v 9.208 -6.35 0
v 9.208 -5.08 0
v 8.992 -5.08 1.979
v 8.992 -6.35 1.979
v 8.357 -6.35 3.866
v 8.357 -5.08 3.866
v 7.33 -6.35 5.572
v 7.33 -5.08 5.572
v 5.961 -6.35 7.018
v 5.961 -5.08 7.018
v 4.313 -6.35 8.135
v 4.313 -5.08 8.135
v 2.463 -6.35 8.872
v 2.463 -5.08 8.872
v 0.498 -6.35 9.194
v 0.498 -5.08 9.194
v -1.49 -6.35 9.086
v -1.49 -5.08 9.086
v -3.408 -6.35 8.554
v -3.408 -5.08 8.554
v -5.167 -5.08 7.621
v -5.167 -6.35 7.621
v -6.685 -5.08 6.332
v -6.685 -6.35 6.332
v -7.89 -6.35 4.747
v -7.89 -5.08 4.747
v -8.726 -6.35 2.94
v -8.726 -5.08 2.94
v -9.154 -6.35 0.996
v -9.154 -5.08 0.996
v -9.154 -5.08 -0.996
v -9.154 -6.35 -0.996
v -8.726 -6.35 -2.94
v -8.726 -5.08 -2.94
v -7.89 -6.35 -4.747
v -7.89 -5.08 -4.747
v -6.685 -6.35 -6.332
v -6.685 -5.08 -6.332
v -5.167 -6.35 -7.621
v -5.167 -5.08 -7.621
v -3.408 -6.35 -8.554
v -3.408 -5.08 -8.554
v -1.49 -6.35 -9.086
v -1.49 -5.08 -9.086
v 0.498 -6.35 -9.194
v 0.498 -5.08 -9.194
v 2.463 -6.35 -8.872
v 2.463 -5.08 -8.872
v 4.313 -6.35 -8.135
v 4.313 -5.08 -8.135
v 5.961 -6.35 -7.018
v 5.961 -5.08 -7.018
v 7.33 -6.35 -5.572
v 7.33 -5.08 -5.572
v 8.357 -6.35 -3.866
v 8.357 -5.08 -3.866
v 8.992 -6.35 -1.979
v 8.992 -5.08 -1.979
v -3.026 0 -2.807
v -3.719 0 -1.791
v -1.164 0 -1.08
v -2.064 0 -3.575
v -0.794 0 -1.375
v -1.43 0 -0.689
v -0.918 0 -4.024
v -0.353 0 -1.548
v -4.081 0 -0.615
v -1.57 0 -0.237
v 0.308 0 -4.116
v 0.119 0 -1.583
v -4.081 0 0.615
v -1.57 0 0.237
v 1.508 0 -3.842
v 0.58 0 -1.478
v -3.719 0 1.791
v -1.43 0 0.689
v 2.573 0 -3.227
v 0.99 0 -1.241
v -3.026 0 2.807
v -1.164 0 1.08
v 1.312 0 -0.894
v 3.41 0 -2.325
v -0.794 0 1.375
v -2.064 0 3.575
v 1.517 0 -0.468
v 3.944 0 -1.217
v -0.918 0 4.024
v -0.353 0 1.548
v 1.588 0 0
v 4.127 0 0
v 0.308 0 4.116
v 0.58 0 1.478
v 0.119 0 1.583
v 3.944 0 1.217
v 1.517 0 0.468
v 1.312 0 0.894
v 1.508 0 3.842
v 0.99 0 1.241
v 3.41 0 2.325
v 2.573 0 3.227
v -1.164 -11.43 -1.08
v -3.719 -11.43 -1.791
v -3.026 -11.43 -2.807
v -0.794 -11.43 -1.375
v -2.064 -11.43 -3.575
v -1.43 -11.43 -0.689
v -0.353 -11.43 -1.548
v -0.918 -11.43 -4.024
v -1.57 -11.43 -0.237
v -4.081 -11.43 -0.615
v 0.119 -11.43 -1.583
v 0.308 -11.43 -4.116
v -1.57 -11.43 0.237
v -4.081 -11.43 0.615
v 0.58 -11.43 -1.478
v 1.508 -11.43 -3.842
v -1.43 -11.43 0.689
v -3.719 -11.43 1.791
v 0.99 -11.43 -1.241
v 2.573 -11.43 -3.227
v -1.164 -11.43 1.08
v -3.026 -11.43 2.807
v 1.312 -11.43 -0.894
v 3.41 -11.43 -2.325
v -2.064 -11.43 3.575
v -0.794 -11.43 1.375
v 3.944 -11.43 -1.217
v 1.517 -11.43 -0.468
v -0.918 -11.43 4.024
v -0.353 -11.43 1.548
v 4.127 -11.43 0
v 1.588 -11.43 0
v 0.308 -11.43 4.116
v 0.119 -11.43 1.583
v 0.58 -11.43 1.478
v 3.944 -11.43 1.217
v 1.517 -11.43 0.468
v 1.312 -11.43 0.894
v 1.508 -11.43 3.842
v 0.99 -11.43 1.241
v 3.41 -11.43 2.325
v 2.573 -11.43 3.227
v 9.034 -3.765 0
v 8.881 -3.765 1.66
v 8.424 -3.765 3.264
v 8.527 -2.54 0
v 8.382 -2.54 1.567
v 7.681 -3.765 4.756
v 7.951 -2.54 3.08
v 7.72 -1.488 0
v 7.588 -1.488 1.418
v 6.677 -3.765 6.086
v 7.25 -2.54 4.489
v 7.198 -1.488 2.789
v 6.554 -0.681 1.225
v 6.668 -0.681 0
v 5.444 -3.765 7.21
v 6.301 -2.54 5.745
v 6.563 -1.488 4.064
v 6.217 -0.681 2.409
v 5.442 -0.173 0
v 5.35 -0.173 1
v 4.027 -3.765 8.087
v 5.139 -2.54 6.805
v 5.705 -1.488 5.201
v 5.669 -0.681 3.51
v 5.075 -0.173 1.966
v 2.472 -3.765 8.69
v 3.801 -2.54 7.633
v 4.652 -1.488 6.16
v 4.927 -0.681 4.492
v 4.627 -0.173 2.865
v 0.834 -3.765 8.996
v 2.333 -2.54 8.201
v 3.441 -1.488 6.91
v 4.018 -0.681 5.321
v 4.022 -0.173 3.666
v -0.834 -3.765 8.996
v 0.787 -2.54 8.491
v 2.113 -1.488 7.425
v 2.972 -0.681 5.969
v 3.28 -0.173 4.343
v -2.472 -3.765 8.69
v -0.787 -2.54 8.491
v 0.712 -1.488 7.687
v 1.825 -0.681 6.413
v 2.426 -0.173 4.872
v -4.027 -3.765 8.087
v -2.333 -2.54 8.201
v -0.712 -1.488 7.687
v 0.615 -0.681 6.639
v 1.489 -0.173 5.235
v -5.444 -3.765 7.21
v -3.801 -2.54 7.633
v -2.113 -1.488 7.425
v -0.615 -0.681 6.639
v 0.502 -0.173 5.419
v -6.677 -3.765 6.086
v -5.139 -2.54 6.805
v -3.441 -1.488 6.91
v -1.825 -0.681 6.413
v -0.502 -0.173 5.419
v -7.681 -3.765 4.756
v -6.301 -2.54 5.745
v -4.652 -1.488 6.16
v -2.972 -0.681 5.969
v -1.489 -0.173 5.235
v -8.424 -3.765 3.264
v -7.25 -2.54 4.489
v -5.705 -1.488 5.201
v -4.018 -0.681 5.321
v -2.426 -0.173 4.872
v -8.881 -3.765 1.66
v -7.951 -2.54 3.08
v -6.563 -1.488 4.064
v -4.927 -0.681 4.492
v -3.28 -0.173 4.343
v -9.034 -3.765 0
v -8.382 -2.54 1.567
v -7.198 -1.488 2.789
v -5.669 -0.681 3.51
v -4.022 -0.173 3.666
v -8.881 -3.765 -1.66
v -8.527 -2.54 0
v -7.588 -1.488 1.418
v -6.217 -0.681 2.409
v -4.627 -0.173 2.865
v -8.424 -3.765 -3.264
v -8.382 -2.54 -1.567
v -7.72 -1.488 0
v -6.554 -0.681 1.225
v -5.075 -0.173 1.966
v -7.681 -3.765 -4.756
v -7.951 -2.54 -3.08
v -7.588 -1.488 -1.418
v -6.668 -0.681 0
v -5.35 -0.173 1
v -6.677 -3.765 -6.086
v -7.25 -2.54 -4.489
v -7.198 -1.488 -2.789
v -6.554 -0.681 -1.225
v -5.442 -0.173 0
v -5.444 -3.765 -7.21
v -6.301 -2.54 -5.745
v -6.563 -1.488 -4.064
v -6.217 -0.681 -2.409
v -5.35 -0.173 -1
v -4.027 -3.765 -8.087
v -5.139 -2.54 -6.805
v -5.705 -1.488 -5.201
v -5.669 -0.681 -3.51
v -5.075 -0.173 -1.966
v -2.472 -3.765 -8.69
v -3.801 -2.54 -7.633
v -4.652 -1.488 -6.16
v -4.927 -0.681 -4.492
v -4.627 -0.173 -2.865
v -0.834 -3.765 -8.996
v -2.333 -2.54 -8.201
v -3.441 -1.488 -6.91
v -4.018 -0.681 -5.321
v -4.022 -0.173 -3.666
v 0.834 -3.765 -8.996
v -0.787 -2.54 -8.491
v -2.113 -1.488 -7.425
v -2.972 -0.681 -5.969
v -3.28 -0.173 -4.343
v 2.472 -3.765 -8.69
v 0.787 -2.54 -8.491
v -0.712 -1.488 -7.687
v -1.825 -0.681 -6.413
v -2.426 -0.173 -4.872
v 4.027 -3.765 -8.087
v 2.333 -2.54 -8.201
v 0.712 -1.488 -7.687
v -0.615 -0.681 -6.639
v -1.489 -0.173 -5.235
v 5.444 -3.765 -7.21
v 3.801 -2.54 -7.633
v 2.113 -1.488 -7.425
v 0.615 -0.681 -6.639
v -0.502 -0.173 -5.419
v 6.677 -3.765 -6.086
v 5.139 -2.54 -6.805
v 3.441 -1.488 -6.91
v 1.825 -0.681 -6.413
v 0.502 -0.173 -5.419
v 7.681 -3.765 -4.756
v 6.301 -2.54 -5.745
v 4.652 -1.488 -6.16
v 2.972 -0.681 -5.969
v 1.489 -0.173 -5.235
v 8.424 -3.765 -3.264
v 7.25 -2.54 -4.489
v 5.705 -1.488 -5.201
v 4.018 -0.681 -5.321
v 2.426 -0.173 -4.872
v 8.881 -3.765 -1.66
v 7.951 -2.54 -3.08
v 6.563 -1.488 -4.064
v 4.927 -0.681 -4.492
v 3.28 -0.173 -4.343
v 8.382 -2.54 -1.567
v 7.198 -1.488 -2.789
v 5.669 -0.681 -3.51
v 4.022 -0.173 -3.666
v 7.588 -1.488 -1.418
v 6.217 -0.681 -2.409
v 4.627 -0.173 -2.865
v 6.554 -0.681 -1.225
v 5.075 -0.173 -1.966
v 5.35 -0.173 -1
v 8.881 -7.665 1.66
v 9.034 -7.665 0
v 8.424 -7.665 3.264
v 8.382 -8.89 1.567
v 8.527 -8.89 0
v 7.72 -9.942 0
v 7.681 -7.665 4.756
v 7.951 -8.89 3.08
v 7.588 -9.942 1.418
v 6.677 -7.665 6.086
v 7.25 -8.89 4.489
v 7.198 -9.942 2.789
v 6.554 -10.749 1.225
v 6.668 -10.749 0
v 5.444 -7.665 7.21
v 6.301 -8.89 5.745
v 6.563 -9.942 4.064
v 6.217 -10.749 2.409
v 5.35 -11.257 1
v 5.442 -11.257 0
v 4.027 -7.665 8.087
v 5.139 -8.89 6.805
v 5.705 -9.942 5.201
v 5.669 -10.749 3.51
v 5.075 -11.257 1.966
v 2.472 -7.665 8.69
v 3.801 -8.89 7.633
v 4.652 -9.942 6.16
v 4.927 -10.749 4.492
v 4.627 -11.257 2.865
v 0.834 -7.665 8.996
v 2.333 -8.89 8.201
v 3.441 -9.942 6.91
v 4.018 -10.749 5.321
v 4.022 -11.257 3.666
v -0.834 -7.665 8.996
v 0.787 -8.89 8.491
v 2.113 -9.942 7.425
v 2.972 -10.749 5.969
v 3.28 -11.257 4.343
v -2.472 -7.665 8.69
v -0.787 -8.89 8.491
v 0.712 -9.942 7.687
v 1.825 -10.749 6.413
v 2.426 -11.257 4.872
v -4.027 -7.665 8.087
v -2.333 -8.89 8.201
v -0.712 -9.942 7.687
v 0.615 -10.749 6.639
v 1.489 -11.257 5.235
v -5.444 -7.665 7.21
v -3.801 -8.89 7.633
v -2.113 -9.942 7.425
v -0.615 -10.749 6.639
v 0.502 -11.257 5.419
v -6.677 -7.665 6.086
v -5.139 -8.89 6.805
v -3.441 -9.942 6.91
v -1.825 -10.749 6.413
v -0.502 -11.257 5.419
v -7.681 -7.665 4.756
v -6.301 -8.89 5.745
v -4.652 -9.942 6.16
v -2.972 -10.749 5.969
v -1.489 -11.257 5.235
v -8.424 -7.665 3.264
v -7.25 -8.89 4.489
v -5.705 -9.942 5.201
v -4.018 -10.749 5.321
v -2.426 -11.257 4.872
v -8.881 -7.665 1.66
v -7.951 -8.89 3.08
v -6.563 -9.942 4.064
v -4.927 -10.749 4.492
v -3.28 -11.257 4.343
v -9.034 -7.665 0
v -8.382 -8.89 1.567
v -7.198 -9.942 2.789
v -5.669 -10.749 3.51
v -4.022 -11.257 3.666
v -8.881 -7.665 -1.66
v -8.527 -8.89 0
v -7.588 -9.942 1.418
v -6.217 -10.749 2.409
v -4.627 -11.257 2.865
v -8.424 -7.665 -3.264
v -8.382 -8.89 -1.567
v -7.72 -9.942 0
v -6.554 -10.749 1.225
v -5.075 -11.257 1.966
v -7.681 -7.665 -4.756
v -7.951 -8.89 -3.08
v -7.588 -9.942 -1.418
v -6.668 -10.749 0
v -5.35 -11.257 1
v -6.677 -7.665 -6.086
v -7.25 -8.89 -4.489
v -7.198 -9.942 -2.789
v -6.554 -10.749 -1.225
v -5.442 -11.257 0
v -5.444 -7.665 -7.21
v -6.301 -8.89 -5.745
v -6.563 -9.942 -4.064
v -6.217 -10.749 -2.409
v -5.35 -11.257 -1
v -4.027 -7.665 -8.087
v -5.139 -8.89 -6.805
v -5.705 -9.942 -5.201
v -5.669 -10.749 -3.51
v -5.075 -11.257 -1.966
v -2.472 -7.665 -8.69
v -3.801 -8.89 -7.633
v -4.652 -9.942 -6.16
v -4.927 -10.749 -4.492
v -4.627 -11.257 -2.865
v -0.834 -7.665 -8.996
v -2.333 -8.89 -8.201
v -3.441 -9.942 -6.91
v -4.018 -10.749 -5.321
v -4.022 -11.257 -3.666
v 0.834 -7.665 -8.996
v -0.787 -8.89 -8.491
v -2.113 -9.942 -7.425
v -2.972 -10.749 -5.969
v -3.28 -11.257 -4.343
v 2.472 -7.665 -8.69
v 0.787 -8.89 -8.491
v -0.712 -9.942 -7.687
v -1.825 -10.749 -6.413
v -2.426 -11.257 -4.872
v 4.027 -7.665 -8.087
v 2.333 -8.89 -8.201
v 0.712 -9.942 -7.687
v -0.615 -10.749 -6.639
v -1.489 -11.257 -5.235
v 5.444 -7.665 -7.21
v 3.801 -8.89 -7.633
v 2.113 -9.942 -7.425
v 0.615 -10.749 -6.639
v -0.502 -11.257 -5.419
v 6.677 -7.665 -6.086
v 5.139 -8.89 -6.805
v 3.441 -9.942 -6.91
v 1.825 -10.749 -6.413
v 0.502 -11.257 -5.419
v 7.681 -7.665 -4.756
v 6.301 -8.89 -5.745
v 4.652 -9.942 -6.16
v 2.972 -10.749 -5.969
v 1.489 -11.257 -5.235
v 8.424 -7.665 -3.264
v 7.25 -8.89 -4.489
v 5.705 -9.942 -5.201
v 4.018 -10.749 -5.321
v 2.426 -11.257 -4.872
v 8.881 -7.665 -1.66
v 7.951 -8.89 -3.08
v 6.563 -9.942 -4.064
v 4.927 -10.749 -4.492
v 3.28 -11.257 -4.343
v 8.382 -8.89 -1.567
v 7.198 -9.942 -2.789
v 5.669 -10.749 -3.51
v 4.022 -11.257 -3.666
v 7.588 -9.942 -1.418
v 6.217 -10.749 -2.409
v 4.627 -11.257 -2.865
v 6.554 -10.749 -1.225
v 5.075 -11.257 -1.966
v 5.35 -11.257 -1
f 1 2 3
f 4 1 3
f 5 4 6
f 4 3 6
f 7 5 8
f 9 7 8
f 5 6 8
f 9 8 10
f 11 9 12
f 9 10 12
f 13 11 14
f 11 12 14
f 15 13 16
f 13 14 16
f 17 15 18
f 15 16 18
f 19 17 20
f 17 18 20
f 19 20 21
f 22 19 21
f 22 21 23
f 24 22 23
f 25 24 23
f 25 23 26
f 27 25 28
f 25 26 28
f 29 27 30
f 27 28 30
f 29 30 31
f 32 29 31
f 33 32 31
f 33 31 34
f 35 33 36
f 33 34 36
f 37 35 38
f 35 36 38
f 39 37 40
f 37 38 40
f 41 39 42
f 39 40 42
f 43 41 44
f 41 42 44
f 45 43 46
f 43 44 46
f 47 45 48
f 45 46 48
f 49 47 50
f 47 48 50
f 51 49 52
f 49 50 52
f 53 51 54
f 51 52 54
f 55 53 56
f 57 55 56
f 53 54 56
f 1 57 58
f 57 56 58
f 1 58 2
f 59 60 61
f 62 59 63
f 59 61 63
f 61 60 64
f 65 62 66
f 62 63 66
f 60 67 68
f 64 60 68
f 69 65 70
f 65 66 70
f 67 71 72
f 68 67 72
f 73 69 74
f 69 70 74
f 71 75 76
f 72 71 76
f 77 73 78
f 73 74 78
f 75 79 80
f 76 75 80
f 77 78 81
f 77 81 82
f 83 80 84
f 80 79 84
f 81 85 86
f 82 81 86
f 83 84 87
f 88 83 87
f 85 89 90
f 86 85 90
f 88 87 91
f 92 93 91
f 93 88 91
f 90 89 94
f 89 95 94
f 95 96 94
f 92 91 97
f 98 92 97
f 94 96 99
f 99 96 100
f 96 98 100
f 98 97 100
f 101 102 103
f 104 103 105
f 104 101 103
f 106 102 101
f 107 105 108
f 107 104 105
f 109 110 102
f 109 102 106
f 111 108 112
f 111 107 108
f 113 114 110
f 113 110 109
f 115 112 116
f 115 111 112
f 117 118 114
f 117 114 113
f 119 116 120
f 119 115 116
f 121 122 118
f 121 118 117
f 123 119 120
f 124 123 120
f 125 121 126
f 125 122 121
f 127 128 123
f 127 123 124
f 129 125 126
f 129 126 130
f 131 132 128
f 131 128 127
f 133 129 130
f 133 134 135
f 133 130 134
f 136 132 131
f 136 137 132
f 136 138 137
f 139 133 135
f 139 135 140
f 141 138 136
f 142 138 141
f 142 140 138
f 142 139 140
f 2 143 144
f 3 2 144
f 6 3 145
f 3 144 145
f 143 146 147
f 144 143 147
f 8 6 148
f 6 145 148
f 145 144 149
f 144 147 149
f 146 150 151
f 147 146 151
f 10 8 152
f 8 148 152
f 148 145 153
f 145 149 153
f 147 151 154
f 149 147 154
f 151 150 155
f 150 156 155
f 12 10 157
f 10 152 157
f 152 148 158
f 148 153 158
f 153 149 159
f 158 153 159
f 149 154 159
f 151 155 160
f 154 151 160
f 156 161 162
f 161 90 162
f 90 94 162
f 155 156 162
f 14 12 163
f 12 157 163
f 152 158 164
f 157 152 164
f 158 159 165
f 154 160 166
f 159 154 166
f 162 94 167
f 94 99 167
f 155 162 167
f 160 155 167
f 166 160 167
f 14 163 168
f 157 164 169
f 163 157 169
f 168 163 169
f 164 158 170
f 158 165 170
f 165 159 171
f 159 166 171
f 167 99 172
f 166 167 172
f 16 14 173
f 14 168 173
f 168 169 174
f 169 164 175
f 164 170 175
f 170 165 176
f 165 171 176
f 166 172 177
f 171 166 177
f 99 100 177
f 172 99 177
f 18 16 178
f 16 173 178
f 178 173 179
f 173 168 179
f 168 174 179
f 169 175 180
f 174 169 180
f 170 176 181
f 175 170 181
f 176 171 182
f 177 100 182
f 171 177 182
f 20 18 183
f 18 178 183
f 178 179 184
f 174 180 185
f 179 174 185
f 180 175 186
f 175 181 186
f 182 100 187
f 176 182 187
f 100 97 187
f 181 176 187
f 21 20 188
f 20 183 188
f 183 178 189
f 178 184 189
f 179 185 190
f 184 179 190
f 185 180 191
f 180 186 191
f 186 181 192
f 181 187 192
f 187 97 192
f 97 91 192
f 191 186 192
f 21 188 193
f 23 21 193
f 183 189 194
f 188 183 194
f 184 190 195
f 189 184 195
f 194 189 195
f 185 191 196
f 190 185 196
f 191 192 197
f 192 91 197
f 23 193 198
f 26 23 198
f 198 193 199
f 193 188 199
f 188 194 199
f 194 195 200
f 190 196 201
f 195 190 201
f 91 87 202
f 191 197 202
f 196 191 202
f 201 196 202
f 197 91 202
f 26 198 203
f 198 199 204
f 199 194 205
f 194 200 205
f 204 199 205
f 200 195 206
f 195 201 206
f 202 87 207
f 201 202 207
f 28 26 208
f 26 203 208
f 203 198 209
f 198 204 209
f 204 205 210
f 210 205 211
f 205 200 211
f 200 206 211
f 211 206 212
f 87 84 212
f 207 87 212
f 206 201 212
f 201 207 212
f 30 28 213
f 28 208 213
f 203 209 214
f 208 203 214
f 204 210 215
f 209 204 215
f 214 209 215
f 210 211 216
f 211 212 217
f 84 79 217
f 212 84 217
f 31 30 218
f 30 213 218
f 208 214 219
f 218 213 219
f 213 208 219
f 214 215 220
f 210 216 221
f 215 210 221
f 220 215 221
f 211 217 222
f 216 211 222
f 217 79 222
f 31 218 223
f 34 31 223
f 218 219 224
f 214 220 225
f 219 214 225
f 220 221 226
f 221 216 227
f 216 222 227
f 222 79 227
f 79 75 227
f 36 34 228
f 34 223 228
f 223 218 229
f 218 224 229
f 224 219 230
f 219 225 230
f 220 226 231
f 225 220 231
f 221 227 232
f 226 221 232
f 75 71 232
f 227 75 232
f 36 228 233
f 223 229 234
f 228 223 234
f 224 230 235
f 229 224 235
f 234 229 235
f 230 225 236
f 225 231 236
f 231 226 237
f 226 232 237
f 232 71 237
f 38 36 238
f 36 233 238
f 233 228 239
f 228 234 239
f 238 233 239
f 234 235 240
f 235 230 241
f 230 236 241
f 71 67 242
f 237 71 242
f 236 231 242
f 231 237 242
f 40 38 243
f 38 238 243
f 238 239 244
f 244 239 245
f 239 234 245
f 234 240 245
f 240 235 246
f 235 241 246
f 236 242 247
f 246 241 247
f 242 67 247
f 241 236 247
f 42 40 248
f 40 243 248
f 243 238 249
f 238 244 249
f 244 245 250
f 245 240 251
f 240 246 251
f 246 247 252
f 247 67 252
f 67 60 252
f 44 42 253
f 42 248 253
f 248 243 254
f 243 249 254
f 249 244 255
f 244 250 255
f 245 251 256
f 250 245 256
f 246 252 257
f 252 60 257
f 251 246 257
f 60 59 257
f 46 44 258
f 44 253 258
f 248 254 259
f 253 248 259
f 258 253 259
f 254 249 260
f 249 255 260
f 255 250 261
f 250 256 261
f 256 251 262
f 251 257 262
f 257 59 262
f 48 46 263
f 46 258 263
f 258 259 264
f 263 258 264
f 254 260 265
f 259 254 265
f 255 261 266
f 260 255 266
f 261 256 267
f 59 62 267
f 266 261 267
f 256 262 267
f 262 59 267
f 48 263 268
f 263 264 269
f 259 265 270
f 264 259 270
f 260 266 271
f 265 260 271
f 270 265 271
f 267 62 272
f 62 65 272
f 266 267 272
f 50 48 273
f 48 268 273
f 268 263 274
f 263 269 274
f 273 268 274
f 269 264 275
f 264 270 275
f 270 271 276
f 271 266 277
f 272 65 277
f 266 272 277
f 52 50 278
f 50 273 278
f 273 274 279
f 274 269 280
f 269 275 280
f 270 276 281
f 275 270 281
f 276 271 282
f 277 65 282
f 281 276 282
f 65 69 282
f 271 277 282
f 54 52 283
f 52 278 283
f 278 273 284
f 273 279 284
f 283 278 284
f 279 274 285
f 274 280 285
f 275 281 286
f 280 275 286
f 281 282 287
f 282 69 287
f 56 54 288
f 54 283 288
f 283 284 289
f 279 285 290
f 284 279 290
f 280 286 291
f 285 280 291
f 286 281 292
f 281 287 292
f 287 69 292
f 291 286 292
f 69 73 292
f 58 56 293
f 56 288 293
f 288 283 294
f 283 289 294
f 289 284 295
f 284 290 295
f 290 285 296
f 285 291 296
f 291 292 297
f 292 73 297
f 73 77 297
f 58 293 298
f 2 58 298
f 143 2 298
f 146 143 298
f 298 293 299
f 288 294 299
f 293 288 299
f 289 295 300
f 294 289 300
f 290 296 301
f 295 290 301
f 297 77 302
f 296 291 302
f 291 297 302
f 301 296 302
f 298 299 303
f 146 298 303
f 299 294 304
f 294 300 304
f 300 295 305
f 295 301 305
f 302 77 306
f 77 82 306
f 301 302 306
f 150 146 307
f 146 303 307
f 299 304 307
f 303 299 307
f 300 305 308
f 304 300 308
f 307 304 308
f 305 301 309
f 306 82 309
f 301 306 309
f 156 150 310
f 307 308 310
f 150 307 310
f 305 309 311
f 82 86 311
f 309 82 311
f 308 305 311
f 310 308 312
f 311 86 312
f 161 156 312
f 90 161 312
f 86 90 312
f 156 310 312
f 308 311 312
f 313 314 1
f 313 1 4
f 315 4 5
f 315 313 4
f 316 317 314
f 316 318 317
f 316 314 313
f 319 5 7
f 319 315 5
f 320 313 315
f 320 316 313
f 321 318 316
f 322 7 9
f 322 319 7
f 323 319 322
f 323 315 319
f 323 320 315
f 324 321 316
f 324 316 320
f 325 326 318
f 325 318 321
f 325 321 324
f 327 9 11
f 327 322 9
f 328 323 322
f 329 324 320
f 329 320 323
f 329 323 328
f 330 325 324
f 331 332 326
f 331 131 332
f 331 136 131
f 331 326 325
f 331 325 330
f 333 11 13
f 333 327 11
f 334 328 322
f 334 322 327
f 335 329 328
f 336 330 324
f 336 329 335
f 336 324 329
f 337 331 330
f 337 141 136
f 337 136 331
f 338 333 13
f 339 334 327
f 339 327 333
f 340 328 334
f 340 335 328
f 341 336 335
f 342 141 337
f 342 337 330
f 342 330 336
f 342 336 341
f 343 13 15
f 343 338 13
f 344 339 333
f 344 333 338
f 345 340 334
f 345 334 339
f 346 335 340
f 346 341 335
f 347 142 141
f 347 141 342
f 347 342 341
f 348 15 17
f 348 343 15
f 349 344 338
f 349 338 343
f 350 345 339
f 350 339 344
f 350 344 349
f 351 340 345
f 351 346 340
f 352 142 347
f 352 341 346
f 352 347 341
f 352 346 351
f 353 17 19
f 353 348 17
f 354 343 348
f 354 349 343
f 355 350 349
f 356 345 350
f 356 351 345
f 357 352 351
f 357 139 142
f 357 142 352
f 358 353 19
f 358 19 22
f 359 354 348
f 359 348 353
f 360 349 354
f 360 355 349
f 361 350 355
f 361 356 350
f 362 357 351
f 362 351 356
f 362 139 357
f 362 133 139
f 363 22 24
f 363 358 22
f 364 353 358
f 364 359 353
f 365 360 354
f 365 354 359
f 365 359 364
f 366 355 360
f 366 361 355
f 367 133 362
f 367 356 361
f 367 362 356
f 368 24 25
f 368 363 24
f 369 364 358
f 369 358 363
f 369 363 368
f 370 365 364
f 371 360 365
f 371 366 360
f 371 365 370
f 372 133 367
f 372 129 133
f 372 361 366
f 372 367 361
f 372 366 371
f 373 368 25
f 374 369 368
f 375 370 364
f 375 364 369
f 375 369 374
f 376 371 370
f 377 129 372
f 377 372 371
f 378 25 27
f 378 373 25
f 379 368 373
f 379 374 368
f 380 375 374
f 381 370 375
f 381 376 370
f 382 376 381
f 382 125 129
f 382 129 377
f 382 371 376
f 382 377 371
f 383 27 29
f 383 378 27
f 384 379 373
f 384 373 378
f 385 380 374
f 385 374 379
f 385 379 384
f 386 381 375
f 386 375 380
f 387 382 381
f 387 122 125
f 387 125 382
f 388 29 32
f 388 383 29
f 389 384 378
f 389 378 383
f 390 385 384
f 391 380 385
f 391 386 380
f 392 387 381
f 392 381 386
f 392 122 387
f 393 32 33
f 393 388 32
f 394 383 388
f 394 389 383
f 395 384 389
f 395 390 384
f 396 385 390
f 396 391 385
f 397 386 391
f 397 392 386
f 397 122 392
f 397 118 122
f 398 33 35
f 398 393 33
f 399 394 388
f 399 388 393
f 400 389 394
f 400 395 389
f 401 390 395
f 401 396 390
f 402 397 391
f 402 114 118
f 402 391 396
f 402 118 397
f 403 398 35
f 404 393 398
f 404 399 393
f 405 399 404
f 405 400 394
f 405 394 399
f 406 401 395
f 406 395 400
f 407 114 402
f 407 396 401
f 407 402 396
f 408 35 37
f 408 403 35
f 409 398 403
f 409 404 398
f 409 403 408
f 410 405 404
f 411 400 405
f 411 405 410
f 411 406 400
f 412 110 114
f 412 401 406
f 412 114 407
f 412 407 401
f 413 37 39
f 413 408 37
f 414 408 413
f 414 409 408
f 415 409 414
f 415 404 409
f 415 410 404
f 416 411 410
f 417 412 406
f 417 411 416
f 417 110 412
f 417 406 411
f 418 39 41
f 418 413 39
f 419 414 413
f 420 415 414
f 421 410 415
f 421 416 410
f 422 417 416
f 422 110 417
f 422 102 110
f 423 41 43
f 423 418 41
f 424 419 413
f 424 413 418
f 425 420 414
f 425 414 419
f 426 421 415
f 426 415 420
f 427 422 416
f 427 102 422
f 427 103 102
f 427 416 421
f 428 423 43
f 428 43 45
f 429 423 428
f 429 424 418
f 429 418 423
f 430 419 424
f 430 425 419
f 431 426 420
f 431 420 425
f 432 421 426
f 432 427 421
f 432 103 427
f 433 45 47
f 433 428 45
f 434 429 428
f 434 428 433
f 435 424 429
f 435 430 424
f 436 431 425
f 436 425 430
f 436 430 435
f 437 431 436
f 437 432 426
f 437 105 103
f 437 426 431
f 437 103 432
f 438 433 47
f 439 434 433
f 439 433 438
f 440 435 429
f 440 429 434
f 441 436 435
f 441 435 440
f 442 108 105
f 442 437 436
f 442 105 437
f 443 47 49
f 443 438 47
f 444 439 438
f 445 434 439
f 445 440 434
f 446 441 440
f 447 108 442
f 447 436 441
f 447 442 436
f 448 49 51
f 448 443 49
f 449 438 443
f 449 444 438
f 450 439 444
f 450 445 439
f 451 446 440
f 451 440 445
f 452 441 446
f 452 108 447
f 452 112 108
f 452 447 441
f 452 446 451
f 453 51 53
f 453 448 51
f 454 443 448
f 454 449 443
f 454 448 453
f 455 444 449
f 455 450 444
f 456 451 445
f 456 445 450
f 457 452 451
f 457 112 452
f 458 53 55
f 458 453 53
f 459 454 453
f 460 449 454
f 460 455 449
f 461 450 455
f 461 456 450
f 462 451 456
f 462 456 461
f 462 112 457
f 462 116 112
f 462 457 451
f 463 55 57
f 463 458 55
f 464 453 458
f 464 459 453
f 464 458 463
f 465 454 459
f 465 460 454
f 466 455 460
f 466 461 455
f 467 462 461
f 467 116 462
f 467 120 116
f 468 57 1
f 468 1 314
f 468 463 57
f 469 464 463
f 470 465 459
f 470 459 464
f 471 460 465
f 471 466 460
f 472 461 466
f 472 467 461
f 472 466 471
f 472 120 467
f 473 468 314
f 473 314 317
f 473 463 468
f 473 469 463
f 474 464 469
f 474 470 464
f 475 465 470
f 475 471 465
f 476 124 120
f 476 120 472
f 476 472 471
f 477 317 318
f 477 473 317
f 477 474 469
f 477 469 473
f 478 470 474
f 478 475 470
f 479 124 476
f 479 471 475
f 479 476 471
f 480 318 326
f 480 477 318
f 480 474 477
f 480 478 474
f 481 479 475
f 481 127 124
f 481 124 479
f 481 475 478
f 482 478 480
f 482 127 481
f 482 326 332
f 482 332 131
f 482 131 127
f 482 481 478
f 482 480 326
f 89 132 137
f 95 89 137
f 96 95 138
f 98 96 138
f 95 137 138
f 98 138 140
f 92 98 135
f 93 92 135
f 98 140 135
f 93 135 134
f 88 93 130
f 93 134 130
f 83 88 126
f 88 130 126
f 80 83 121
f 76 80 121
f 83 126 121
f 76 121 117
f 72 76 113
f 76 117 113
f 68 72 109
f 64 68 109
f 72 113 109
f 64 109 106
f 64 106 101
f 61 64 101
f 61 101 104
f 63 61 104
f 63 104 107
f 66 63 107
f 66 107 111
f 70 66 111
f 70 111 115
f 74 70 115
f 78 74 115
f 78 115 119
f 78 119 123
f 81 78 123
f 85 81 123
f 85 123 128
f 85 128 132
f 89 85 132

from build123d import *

# Parameters (mm, degrees)
F0_R     = 9.2075
F1_DEPTH = 11.43
F2_R     = 5.08
F3_R     = 1.5875
F4_DEPTH = 25.4


with BuildPart() as f1:
    # F0 (on Front) → F1 (new body)
    with BuildSketch(Plane.XZ):
        Circle(F0_R)
    extrude(amount=F1_DEPTH)

    # F2
    f2_edges = [f1.edges().sort_by_distance(p)[0] for p in [
        (-9.2075, -11.43, 0),
        (-9.2075, 0, 0),
    ]]
    fillet(f2_edges, radius=F2_R)

    # F3 (on face) → F4 (cut)
    with BuildSketch(Plane.XZ.offset(11.43)):
        Circle(F3_R)
    extrude(amount=-F4_DEPTH, mode=Mode.SUBTRACT)


solid = f1.part
